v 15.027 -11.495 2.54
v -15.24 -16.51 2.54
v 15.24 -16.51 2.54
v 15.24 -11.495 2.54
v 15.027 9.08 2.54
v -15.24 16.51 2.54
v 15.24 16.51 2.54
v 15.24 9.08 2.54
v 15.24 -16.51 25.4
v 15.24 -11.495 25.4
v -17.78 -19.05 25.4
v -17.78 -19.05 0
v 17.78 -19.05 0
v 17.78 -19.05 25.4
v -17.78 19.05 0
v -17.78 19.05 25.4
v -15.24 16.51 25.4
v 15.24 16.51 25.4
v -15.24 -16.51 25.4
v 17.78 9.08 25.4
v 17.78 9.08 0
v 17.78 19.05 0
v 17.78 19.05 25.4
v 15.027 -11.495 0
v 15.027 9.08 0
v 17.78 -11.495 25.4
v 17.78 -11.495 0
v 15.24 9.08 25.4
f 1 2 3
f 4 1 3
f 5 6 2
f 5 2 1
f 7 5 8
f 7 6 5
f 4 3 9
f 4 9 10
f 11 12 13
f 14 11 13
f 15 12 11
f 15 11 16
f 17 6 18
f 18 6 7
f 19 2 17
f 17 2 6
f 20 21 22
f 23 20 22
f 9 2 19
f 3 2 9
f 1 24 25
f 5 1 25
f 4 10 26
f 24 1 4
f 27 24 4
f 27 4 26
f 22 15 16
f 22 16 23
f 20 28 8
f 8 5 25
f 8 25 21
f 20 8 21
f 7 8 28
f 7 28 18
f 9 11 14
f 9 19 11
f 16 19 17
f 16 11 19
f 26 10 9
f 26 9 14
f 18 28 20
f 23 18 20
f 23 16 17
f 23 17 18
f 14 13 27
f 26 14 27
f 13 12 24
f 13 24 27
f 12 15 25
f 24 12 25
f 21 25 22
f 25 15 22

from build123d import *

# Parameters (mm, degrees)
F0_W     = 35.56
F0_H     = 38.1
F1_DEPTH = 25.4
F2_T     = -2.54
F3_W     = 25.4
F3_H     = 20.575015
F4_DEPTH = 25.4


with BuildPart() as f1:
    # F0 (on Top) → F1 (new body)
    with BuildSketch(Plane.XY):
        Rectangle(F0_W, F0_H)
    extrude(amount=F1_DEPTH)

    # F2
    f2_openings = [f1.faces().sort_by_distance(p)[0] for p in [
        (0, 0, 25.4),
    ]]
    offset(amount=F2_T, openings=f2_openings)

    # F3 (on Top) → F4 (cut)
    with BuildSketch(Plane.XY):
        with Locations((27.727038, -1.20786)):
            Rectangle(F3_W, F3_H)
    extrude(amount=F4_DEPTH, mode=Mode.SUBTRACT)


solid = f1.part
